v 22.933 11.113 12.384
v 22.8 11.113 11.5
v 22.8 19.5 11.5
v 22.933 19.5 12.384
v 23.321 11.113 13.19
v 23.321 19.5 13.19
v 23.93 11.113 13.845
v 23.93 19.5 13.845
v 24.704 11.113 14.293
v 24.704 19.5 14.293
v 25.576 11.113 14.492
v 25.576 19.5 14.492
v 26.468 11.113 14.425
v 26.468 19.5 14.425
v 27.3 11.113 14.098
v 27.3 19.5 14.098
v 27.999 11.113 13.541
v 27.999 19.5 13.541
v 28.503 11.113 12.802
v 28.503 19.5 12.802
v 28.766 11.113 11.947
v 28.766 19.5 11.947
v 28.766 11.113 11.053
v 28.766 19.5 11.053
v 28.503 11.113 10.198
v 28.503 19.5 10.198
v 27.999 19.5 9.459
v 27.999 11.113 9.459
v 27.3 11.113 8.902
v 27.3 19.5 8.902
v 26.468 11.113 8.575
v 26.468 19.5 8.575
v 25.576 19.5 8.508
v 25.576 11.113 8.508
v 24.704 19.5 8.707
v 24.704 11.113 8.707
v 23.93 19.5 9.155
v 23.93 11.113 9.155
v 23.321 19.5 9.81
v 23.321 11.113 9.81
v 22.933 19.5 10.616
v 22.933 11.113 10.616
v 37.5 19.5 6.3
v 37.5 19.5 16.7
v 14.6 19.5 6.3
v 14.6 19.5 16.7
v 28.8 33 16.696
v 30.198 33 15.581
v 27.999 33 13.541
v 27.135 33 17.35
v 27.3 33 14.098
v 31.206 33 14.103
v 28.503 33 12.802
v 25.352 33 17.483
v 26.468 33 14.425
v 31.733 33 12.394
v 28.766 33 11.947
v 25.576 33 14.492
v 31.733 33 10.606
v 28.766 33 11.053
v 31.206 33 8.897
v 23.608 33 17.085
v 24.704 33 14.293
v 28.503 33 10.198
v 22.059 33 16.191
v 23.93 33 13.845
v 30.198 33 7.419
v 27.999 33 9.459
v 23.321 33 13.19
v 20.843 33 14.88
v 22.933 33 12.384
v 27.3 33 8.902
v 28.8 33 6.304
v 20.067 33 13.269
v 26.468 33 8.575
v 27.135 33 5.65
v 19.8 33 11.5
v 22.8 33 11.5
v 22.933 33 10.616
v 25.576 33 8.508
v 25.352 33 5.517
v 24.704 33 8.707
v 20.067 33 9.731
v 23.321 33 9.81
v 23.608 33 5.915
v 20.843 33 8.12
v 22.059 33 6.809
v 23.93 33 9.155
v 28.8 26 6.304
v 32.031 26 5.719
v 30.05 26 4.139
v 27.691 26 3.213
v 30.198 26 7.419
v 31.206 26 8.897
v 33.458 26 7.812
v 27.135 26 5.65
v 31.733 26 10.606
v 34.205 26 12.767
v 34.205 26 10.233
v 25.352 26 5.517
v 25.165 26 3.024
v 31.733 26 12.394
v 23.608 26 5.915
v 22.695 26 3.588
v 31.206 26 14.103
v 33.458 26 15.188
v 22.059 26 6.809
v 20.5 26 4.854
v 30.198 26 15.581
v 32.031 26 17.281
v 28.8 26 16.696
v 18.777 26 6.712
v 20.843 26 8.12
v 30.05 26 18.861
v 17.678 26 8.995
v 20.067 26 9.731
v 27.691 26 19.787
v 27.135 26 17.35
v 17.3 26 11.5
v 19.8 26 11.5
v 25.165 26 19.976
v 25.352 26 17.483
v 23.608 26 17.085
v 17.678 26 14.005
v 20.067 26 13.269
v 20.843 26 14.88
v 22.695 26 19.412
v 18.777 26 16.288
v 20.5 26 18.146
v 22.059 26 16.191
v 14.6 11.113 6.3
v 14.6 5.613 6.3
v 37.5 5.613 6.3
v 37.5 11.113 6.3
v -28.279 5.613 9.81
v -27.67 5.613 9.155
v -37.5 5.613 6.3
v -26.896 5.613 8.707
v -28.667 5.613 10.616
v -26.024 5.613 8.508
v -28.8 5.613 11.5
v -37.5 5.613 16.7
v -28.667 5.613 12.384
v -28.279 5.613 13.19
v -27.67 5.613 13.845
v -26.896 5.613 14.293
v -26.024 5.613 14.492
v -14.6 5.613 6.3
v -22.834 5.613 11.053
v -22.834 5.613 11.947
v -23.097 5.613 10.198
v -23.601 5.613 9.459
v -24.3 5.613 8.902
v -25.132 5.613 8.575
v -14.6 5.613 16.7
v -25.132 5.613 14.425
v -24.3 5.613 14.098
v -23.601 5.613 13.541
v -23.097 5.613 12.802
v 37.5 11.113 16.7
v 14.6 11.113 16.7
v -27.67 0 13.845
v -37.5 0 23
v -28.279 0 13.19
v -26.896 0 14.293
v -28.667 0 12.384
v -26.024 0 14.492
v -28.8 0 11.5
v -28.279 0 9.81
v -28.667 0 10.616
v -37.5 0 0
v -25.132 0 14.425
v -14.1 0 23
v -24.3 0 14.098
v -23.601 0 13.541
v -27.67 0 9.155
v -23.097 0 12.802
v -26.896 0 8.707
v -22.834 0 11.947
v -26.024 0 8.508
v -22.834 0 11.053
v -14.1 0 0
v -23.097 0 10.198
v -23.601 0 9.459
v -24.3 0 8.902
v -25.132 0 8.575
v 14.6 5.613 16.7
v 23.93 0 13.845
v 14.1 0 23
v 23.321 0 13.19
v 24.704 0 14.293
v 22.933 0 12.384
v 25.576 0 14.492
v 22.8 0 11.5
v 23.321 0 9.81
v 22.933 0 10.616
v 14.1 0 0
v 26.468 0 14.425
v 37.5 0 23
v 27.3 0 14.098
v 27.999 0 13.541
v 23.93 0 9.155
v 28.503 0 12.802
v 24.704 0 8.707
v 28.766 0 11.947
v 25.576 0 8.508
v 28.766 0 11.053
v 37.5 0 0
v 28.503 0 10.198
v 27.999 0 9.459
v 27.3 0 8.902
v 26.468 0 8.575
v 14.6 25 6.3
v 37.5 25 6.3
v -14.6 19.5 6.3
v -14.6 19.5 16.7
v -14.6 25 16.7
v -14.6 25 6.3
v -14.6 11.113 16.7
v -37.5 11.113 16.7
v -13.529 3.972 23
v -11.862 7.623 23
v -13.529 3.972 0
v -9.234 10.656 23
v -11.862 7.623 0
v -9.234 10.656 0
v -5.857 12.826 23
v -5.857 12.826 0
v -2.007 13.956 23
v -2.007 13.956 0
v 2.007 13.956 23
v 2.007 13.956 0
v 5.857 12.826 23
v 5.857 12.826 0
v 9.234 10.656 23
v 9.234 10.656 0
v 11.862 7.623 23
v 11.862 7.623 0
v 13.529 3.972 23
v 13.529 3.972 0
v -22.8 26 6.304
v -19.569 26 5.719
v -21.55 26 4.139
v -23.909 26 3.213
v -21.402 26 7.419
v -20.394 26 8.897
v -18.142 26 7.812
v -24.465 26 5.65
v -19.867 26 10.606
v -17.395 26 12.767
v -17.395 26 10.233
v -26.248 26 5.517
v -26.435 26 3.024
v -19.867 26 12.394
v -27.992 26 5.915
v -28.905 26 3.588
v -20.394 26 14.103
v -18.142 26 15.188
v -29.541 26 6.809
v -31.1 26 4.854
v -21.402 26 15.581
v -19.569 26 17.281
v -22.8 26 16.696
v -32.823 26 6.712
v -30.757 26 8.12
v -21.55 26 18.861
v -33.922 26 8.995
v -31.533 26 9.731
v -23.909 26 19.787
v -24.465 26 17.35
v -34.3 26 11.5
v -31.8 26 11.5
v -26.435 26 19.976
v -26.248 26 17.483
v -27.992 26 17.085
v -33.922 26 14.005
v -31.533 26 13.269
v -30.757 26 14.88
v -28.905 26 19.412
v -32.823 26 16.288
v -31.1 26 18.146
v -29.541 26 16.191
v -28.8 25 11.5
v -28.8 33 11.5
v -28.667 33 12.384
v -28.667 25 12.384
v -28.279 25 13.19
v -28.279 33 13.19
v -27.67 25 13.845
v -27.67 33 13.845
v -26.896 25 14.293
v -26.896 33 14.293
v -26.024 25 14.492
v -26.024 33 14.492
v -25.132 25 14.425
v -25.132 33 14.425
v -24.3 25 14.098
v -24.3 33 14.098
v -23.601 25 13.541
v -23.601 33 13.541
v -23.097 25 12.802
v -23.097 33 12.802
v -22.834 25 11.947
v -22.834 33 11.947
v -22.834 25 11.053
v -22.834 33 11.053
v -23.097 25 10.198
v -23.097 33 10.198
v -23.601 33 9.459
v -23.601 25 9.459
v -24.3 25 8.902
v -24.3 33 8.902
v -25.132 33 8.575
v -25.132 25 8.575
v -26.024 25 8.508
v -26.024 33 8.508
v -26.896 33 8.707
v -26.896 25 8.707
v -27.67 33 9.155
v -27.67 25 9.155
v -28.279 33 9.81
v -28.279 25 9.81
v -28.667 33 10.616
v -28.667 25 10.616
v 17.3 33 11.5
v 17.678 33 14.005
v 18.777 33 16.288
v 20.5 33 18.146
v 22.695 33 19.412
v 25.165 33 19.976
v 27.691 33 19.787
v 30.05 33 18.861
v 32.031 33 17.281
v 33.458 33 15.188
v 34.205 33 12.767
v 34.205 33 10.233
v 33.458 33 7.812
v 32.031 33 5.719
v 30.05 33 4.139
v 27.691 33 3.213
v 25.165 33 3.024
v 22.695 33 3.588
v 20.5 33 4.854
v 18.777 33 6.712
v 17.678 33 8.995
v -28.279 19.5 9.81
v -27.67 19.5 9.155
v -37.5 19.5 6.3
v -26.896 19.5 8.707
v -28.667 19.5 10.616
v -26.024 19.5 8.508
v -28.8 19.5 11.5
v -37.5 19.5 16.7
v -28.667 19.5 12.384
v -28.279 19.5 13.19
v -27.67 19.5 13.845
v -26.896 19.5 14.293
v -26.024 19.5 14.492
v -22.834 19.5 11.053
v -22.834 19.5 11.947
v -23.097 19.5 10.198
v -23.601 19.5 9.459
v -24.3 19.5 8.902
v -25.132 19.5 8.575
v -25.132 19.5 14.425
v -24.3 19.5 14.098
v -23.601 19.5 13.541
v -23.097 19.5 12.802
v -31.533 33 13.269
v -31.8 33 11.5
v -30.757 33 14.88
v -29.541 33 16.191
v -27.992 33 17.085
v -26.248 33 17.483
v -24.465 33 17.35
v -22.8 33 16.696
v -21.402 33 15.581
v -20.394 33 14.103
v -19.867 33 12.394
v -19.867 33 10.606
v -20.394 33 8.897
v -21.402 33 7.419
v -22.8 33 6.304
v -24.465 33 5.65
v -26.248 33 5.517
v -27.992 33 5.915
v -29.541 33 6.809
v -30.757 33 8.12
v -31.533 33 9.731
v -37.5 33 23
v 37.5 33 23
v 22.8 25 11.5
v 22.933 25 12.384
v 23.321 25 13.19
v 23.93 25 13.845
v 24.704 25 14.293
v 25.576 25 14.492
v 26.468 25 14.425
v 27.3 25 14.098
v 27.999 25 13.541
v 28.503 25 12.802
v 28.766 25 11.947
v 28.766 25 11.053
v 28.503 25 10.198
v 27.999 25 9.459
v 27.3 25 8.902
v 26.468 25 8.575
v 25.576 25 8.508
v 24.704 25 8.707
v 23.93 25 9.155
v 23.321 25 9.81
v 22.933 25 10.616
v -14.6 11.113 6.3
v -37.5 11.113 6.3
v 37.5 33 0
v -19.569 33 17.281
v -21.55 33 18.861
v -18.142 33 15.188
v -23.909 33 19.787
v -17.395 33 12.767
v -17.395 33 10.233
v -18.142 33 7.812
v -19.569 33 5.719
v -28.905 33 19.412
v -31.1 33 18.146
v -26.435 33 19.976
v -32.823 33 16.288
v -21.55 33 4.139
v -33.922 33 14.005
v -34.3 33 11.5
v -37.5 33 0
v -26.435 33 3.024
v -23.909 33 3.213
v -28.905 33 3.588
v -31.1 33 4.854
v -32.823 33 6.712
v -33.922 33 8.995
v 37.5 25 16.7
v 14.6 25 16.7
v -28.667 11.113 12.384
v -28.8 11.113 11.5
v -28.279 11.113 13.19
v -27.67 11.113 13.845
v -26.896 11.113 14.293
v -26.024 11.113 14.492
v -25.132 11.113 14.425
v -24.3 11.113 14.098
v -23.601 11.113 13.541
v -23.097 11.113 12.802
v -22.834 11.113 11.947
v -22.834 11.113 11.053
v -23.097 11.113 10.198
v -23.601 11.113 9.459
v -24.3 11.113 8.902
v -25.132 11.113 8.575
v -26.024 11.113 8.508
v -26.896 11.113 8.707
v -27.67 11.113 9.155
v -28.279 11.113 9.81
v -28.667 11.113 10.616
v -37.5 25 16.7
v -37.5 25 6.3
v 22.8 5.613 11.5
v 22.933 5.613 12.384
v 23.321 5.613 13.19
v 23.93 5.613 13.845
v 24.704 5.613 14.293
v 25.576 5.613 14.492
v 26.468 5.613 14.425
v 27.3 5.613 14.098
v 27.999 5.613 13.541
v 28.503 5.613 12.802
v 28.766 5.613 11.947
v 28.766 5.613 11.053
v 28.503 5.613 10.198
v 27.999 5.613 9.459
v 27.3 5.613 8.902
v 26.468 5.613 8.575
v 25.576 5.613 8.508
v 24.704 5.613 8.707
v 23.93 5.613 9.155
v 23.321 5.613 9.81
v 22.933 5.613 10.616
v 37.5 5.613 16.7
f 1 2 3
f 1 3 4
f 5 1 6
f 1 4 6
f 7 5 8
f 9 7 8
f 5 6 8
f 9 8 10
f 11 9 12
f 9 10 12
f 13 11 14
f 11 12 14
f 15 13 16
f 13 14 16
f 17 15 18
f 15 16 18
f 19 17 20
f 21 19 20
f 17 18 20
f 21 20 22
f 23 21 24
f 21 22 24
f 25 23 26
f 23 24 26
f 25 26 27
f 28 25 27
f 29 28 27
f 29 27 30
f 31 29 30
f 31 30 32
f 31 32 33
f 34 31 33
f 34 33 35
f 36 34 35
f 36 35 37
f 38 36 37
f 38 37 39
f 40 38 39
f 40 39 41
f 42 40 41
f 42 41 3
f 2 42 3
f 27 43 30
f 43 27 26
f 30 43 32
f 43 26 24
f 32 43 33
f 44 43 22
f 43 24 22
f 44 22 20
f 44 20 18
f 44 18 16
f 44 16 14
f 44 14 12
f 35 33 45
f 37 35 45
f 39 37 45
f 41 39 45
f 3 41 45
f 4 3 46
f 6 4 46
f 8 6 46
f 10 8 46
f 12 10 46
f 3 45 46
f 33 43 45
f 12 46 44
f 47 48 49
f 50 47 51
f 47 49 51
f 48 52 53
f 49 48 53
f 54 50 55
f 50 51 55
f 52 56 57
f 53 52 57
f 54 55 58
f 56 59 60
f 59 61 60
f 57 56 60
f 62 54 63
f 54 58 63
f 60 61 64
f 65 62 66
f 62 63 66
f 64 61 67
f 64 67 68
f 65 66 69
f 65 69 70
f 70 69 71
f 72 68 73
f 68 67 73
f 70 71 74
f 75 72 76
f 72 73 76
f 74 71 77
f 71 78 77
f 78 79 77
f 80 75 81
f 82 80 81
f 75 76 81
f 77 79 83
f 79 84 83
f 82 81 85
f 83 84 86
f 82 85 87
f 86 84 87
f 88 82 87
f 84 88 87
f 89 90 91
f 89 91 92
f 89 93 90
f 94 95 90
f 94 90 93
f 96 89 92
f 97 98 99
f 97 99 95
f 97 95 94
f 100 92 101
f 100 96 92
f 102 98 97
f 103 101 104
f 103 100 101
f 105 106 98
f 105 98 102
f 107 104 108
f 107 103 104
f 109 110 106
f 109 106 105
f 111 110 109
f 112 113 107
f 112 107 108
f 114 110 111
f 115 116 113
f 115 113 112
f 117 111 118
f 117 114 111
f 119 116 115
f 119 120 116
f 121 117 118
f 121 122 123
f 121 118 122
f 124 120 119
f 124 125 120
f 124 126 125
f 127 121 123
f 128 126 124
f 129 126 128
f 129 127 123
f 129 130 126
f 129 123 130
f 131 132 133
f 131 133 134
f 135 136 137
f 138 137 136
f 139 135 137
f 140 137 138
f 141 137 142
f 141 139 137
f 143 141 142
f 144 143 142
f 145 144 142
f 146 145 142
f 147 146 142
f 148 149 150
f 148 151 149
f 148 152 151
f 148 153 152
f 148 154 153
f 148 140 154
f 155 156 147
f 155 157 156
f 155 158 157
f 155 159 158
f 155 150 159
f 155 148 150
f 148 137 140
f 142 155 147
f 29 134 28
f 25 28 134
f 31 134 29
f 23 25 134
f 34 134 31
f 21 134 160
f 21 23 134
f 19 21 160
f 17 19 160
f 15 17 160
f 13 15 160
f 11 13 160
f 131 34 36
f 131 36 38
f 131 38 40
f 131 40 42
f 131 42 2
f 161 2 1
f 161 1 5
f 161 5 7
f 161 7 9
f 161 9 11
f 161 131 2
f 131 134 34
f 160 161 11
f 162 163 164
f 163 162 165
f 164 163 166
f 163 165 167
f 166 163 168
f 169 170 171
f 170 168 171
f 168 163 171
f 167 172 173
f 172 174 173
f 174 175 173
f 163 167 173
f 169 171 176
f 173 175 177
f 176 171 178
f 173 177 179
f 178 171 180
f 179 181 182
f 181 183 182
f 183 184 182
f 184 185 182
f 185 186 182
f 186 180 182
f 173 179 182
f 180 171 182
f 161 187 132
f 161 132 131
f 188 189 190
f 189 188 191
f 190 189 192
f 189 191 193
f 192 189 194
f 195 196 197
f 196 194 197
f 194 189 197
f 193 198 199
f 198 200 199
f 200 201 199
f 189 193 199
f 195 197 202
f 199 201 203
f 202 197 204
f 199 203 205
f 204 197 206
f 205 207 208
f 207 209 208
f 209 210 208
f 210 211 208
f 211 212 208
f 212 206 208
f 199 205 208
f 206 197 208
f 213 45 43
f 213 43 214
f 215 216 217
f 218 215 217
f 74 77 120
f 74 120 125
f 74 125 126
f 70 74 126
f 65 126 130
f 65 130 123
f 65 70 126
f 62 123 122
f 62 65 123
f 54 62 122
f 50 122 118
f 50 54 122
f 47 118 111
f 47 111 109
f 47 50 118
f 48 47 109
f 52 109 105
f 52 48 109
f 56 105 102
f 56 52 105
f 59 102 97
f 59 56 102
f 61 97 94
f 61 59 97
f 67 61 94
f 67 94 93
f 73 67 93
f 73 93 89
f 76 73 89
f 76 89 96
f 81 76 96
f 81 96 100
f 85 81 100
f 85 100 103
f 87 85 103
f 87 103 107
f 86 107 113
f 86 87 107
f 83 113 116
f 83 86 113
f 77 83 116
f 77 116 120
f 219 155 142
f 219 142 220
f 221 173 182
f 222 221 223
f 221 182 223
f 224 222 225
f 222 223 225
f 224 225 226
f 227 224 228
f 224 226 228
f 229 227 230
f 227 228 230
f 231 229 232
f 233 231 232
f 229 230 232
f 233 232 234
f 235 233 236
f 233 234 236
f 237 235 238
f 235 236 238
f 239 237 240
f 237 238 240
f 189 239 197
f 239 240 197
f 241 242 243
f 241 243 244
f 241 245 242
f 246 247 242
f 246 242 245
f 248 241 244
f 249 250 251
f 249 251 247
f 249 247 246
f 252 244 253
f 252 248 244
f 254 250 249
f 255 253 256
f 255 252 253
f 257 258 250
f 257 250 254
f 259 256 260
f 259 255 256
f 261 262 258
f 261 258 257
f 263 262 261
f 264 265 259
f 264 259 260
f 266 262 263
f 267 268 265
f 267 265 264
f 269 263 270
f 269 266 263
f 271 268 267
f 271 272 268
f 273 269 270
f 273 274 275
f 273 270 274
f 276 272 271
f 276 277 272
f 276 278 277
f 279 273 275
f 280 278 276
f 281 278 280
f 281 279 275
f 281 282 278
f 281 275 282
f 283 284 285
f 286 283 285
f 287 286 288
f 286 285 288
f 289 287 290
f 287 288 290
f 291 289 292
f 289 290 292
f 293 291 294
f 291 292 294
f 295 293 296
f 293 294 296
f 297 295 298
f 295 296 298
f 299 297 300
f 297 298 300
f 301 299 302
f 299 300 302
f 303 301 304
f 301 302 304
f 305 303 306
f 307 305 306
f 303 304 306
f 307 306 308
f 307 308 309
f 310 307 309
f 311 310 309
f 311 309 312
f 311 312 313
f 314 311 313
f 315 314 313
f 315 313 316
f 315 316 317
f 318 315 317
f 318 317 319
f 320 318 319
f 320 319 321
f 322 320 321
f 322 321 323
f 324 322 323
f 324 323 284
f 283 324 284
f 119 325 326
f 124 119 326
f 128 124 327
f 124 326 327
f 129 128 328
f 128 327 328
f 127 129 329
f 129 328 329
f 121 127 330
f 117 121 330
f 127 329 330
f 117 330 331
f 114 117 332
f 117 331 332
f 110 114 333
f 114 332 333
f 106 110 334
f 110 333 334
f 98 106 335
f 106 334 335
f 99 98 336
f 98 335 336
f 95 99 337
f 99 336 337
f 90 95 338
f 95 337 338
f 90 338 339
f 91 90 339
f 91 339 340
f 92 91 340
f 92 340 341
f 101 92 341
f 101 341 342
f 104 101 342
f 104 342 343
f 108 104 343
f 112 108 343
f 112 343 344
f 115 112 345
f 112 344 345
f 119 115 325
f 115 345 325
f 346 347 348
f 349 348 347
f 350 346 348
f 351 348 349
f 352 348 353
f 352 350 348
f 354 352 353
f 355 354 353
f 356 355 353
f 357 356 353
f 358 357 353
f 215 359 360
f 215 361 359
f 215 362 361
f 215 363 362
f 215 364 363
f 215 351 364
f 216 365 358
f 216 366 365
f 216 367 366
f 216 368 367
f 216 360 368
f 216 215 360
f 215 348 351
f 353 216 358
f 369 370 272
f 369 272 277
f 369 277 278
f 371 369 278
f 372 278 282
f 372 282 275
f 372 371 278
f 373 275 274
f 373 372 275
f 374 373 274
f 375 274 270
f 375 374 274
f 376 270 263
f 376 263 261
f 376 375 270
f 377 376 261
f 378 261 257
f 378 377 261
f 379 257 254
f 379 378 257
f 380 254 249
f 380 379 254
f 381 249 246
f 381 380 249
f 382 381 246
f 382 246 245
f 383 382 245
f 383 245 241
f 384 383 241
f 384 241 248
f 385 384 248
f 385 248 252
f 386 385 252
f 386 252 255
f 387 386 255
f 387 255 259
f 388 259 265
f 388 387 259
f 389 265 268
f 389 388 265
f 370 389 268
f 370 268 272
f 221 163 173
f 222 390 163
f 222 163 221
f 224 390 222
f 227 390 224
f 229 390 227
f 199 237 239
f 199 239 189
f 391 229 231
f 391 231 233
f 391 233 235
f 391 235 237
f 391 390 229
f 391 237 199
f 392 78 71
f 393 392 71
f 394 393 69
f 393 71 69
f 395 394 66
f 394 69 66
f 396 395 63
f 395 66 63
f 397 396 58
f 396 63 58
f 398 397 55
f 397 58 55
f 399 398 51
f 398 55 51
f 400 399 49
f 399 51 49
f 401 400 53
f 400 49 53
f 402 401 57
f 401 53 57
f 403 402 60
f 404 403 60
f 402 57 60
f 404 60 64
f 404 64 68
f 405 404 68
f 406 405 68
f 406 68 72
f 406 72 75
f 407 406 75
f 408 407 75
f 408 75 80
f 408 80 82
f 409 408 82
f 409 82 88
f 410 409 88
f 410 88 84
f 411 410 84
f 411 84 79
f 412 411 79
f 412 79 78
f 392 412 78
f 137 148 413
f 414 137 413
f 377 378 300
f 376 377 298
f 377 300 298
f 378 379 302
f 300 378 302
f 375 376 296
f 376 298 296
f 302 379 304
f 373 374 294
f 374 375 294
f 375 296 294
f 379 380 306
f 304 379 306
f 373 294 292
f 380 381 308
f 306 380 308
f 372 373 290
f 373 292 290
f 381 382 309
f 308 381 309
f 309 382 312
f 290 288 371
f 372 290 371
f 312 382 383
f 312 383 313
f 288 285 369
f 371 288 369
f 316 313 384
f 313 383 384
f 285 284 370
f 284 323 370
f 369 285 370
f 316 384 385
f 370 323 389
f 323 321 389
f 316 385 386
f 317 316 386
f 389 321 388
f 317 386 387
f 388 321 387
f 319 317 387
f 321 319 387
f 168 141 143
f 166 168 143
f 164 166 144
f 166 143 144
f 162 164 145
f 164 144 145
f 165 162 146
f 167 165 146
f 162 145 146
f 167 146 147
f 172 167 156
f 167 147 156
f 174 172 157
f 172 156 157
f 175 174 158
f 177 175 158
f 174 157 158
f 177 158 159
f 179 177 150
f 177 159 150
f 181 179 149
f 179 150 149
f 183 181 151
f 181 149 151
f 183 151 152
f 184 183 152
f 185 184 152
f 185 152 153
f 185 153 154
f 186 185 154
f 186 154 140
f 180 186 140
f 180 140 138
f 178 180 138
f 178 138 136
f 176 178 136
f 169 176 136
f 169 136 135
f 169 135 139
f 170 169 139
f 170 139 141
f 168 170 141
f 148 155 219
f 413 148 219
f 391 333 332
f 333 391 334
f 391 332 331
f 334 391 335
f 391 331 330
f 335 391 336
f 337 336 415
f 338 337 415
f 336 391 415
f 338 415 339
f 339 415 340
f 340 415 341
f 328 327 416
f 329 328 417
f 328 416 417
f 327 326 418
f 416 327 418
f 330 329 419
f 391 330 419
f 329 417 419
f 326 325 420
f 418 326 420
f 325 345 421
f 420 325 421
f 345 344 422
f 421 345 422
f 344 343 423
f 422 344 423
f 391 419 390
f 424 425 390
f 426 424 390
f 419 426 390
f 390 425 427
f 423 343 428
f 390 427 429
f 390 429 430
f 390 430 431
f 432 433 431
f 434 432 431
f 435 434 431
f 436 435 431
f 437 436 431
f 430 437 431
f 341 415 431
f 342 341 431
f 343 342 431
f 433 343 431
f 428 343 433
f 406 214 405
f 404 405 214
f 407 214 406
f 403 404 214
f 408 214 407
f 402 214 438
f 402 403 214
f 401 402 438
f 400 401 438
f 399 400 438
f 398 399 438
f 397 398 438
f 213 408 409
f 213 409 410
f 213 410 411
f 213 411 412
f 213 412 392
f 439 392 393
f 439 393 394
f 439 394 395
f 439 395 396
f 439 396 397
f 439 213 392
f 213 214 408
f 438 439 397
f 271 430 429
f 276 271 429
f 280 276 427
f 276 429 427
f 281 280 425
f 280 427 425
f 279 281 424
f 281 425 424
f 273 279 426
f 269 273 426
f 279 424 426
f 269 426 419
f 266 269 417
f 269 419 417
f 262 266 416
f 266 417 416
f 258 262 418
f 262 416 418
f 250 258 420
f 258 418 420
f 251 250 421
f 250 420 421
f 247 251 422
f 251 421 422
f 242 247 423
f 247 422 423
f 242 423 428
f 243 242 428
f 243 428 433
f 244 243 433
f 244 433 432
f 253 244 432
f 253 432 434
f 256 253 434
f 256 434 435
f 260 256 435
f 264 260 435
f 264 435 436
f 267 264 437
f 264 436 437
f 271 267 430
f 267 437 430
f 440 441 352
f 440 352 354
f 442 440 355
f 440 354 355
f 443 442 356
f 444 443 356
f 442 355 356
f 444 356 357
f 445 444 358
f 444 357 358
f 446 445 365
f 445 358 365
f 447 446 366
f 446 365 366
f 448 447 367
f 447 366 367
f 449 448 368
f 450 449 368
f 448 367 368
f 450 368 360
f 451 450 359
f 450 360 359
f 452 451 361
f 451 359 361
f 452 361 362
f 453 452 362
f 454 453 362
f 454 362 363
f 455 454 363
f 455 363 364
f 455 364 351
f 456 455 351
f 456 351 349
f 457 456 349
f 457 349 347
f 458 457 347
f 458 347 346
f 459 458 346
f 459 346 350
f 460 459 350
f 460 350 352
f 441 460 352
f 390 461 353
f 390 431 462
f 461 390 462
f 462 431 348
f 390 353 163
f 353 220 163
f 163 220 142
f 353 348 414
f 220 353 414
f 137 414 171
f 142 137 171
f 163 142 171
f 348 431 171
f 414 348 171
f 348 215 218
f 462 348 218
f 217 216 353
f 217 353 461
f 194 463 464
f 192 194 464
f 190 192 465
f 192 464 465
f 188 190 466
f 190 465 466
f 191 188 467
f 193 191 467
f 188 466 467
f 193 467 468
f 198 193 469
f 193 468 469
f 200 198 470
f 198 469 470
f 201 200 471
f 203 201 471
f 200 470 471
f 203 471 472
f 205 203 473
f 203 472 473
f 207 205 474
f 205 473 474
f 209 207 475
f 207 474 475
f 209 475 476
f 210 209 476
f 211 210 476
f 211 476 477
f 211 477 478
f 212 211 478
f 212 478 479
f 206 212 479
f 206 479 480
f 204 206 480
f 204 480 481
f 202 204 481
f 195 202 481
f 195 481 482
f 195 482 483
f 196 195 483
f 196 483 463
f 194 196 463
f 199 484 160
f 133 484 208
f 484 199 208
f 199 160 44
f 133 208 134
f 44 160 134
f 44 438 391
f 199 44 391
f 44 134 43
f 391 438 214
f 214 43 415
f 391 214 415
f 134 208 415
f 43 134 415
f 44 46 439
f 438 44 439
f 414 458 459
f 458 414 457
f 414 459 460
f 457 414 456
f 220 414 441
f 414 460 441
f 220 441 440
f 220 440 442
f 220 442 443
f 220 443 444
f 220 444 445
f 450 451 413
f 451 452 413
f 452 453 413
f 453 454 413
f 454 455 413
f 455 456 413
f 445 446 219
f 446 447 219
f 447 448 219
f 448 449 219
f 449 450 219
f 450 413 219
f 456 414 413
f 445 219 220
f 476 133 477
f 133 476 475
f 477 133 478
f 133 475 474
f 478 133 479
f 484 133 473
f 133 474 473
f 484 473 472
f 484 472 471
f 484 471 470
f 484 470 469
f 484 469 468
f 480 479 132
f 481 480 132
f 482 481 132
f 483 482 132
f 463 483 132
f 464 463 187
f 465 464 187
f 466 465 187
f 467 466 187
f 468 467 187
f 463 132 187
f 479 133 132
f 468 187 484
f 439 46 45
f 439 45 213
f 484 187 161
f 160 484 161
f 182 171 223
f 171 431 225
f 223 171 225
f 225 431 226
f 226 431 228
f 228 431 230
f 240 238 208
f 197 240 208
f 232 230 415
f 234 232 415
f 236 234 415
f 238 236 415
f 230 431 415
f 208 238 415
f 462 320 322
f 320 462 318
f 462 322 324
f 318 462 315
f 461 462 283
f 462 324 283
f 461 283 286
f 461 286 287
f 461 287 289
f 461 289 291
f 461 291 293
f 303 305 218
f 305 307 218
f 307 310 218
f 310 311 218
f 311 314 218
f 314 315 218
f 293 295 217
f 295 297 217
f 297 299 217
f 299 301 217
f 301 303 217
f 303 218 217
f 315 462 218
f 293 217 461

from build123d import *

# Parameters (mm, degrees)
F1_DEPTH  = 23
F5_D      = 6
F6_D      = 6
F7_START  = 14.6
F2_W      = 5.5
F2_H      = 10.4
F7_DEPTH  = 29.6
F9_R      = 8.5
F9_R_2    = 6
F10_DEPTH = 7
F8_R      = 8.5
F8_R_2    = 6
F11_DEPTH = 7
F12_START = -14.6
F12_DEPTH = 30.8


with BuildPart() as f1:
    # F0 (on Top) → F1 (new body)
    with BuildSketch(Plane.XY):
        with BuildLine():
            Line((37.5, 33), (-37.5, 33))
            Line((-37.5, 33), (-37.5, 0))
            Line((-37.5, 0), (-14.1, 0))
            ThreePointArc((-14.1, 0), (0, 14.1), (14.1, 0))
            Line((14.1, 0), (37.5, 0))
            Line((37.5, 0), (37.5, 33))
        make_face()
    extrude(amount=F1_DEPTH)

    # F5 (through all)
    with Locations(Plane.XZ):
        with Locations((-25.8, 11.5)):
            Hole(F5_D / 2)

    # F6 (through all)
    with Locations(Plane.XZ):
        with Locations((25.8, 11.5)):
            Hole(F6_D / 2)

    # F2 (on Right) → F7 (cut)
    with BuildSketch(Plane.YZ.offset(F7_START)):
        with Locations((8.363037575, 11.5)):
            Rectangle(F2_W, F2_H)
        with Locations((22.25, 11.5)):
            Rectangle(F2_W, F2_H)
    extrude(amount=F7_DEPTH, mode=Mode.SUBTRACT)

    # F9 (on face) → F10 (cut)
    with BuildSketch(Plane(origin=(0, 33, 0), x_dir=(-1, 0, 0), z_dir=(0, 1, 0))):
        with Locations((-25.8, 11.5)):
            Circle(F9_R)
        with Locations((-25.8, 11.5)):
            Circle(F9_R_2, mode=Mode.SUBTRACT)
    extrude(amount=-F10_DEPTH, mode=Mode.SUBTRACT)

    # F8 (on face) → F11 (cut)
    with BuildSketch(Plane(origin=(0, 33, 0), x_dir=(-1, 0, 0), z_dir=(0, 1, 0))):
        with Locations((25.8, 11.5)):
            Circle(F8_R)
        with Locations((25.8, 11.5)):
            Circle(F8_R_2, mode=Mode.SUBTRACT)
    extrude(amount=-F11_DEPTH, mode=Mode.SUBTRACT)

    # F2 (on Right) → F12 (cut)
    with BuildSketch(Plane.YZ.offset(F12_START)):
        with Locations((8.363037575, 11.5)):
            Rectangle(F2_W, F2_H)
        with Locations((22.25, 11.5)):
            Rectangle(F2_W, F2_H)
    extrude(amount=-F12_DEPTH, mode=Mode.SUBTRACT)


solid = f1.part
